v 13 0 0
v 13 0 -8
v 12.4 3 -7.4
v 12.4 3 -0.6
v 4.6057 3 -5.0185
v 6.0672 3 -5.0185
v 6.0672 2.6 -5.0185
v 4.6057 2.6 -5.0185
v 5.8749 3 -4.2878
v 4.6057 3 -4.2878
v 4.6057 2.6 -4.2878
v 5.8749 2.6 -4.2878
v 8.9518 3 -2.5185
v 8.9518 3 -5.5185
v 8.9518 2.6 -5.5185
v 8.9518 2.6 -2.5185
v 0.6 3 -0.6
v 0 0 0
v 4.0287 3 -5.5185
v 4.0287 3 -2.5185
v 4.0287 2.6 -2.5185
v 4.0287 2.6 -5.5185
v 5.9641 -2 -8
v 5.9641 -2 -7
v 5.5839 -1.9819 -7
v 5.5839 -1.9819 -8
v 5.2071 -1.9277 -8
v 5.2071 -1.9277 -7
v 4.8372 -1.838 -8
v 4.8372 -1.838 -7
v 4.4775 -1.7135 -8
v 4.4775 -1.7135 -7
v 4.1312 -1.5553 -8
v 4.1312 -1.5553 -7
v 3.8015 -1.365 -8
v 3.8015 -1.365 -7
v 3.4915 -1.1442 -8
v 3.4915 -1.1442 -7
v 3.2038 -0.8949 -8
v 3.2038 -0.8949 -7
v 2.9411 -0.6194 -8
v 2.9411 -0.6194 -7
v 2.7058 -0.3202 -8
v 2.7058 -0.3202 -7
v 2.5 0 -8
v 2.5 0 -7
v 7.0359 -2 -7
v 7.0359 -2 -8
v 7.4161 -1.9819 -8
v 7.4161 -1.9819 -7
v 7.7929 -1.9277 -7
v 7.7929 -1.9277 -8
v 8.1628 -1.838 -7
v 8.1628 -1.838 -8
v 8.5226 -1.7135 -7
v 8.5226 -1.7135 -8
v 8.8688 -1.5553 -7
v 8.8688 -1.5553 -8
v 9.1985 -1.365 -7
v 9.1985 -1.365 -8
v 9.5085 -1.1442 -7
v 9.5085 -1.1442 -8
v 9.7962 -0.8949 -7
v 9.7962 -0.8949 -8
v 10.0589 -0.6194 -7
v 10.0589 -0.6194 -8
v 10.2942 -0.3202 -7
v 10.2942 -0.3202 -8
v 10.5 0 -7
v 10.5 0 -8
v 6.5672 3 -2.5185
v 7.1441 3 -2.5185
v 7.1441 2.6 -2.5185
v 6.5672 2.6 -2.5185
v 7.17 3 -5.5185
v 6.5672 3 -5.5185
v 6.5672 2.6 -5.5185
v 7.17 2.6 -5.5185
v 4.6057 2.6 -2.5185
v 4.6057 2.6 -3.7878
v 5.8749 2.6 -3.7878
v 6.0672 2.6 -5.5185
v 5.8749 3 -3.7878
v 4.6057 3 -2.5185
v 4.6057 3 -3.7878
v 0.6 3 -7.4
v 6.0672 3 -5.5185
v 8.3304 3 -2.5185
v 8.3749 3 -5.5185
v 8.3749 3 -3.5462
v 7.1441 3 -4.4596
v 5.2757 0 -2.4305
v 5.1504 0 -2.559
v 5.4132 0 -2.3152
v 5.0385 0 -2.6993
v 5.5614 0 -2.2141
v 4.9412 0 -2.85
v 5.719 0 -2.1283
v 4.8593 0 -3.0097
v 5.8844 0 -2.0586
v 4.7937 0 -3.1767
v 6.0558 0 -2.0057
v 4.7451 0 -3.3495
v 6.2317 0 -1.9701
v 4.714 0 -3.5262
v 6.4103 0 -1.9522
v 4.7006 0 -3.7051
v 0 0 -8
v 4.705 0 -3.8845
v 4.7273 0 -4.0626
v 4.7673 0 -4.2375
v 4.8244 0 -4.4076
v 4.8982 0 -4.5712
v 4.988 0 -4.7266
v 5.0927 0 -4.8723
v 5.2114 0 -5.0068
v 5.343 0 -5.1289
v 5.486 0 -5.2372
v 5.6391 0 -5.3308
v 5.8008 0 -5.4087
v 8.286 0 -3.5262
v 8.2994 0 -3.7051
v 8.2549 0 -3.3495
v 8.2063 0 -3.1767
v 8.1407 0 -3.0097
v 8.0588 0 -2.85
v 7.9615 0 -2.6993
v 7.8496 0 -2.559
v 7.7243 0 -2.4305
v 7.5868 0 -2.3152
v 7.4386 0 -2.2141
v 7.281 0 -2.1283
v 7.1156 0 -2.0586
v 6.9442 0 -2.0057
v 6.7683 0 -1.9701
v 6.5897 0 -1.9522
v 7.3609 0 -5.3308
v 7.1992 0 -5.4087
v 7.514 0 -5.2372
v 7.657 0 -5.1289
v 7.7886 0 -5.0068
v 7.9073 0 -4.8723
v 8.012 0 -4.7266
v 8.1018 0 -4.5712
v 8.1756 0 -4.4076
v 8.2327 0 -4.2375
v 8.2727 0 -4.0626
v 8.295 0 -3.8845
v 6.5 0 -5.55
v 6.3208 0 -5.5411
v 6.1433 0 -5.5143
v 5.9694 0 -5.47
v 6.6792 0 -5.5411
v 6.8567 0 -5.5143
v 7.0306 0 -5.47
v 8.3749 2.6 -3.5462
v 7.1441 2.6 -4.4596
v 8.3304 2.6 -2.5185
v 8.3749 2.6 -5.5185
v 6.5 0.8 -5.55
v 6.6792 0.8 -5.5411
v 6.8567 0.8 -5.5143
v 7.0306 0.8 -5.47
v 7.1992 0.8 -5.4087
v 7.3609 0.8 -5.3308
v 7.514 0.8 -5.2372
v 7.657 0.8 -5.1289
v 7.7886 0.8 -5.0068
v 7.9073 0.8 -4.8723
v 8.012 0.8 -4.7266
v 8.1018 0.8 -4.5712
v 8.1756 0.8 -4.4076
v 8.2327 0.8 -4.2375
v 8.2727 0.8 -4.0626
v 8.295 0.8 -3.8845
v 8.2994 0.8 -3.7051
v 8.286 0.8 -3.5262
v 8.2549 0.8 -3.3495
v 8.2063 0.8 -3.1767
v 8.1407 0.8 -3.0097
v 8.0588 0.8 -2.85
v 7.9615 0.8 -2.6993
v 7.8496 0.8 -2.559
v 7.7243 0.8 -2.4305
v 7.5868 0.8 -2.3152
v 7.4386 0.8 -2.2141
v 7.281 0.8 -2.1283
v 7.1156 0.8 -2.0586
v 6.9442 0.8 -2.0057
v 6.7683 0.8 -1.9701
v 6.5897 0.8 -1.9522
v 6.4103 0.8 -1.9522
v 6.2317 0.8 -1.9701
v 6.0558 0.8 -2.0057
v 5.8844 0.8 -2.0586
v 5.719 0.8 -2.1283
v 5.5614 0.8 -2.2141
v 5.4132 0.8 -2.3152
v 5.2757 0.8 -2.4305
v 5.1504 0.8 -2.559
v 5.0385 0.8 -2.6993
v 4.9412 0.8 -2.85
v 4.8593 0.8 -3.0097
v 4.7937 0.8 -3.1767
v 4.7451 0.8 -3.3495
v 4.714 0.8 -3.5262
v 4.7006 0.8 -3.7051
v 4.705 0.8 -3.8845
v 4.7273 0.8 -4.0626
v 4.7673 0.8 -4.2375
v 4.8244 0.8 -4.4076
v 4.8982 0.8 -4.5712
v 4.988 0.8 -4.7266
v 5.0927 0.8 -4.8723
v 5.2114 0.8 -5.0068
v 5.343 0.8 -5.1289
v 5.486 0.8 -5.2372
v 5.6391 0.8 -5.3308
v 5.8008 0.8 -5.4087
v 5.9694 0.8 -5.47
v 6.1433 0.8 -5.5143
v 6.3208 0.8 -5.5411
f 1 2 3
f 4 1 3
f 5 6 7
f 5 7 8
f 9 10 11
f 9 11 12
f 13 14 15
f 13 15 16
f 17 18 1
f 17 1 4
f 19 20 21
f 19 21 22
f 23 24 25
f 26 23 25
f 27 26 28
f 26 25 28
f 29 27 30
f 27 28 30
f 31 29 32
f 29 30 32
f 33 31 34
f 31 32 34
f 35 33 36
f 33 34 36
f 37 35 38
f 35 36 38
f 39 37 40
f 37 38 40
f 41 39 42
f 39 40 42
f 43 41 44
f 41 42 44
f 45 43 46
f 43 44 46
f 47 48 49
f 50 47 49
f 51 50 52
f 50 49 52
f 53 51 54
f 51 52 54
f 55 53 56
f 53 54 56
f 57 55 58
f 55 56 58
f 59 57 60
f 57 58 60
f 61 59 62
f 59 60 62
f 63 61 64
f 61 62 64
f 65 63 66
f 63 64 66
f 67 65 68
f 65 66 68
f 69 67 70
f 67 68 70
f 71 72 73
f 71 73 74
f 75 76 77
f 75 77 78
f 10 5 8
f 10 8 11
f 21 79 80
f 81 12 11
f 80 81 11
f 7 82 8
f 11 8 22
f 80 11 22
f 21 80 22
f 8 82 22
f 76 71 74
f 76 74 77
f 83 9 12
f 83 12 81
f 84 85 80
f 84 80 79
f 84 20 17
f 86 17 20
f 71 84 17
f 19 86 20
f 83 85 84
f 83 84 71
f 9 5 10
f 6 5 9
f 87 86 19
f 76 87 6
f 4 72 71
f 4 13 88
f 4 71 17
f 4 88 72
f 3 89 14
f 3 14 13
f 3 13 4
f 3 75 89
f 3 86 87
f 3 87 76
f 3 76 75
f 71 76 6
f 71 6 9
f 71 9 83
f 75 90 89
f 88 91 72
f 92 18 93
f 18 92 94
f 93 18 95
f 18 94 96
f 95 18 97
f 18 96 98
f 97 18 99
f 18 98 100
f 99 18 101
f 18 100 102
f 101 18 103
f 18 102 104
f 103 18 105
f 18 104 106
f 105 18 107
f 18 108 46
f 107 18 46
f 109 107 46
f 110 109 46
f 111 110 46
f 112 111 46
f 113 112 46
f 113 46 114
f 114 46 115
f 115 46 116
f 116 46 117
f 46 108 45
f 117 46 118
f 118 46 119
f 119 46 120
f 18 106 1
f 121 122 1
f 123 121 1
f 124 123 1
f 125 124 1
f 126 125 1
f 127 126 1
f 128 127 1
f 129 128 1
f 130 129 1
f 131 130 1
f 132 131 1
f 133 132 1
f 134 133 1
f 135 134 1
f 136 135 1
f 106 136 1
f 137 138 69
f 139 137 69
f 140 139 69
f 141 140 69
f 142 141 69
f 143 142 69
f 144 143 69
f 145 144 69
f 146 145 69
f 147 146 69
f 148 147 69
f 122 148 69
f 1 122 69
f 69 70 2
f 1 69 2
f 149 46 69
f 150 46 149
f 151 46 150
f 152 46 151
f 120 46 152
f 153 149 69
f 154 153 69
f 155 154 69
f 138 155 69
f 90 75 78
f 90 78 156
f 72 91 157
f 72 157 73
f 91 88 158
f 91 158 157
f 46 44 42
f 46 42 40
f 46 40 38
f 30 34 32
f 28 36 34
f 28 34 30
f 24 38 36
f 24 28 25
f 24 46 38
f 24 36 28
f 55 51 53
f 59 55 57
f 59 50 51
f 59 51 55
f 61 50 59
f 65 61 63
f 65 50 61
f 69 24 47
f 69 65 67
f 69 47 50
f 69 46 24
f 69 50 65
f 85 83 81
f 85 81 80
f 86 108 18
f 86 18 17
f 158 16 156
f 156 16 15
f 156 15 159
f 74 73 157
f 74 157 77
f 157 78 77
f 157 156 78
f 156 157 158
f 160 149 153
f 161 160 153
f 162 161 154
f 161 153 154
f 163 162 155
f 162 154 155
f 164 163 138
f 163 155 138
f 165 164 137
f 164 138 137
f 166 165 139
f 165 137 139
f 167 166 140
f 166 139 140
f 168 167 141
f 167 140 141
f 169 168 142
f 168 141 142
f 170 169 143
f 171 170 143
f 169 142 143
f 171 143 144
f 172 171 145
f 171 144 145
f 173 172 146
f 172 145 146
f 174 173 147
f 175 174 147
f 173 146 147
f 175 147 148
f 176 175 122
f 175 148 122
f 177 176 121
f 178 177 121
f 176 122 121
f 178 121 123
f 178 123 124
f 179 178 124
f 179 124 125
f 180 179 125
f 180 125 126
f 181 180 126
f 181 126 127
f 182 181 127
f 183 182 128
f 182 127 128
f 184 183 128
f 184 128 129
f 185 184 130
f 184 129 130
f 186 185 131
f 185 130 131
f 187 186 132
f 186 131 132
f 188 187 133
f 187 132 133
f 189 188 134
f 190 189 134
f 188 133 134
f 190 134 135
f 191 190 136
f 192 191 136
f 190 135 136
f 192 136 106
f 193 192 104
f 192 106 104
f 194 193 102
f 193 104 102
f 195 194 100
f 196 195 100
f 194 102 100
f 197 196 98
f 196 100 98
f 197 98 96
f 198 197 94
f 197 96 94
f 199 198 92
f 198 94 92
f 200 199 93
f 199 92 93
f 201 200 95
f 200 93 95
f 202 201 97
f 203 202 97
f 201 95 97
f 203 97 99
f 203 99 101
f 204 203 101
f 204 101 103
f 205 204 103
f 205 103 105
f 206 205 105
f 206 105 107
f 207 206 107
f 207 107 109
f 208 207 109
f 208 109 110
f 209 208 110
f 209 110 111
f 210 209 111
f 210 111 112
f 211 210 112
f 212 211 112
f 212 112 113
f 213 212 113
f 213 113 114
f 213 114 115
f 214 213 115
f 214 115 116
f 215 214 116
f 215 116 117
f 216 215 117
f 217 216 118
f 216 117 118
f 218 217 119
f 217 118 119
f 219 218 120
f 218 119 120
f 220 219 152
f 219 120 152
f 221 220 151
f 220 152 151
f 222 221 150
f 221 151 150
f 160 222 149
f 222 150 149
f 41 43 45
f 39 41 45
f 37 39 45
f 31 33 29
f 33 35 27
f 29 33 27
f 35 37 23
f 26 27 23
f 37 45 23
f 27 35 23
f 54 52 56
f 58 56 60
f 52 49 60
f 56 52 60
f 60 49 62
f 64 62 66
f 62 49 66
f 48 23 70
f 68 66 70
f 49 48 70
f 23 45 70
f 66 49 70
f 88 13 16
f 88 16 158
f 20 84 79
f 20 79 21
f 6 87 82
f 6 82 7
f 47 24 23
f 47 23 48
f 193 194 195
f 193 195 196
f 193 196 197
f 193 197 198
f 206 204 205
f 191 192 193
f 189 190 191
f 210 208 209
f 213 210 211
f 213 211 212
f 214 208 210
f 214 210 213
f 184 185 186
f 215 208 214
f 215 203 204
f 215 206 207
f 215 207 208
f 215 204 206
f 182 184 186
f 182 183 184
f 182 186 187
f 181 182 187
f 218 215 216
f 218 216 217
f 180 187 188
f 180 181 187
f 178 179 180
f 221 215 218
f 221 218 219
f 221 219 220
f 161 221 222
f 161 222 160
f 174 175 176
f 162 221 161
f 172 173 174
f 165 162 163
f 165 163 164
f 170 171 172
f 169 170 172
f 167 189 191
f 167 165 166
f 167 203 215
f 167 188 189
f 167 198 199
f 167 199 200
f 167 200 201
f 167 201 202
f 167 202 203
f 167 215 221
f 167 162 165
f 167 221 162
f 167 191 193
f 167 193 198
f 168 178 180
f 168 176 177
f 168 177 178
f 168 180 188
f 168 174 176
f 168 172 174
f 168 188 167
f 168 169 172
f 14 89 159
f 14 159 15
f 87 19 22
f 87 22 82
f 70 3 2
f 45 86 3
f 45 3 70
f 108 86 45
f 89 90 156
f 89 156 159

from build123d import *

# Parameters (mm, degrees)
SKETCH1_W               = 13
SKETCH1_H               = 8
BOSS_EXTRUDE1_DEPTH     = 3
CUT_EXTRUDE1_DEPTH      = 16.556349186
CUT_EXTRUDE1_DEPTH_BACK = 16.556349186
CUT_EXTRUDE2_DEPTH      = 16.556349186
CUT_EXTRUDE2_DEPTH_BACK = 16.556349186
SKETCH4_R               = 1.8
CUT_EXTRUDE3_DEPTH      = 0.8
SKETCH5_W               = 8
SKETCH5_H               = 1
BOSS_EXTRUDE2_DEPTH     = 2
FILLET1_R               = 4
CUT_EXTRUDE4_DEPTH      = 0.4


with BuildPart() as part:
    # Sketch1 → Boss-Extrude1 (new body)
    with BuildSketch(Plane(origin=(0, 0, 0), x_dir=(1, 0, 0), z_dir=(0, 1, 0))):
        with Locations((6.5, 4)):
            Rectangle(SKETCH1_W, SKETCH1_H)
    extrude(amount=BOSS_EXTRUDE1_DEPTH)

    # Sketch2 → Cut-Extrude1 (cut, two sides: drawn at the far end of the back side and taken through both)
    with BuildSketch(Plane.XY.offset(-CUT_EXTRUDE1_DEPTH_BACK)):
        Polygon((0, 0), (0.6, 3), (0, 3), align=None)
        Polygon((13, 0), (12.4, 3), (13, 3), align=None)
    extrude(amount=CUT_EXTRUDE1_DEPTH + CUT_EXTRUDE1_DEPTH_BACK, mode=Mode.SUBTRACT)

    # Sketch3 → Cut-Extrude2 (cut, two sides: drawn at the far end of the back side and taken through both)
    with BuildSketch(Plane(origin=(0, 0, 0), x_dir=(0, 0, -1), z_dir=(1, 0, 0)).offset(-CUT_EXTRUDE2_DEPTH_BACK)):
        Polygon((0, 0), (0.6, 3), (0, 3), align=None)
        Polygon((8, 3), (7.4, 3), (8, 0), align=None)
    extrude(amount=CUT_EXTRUDE2_DEPTH + CUT_EXTRUDE2_DEPTH_BACK, mode=Mode.SUBTRACT)

    # Sketch4 → Cut-Extrude3 (cut)
    with BuildSketch(Plane.XZ):
        with Locations(Location((6.50000125, -3.75, 0), (0, 0, 270))):
            Circle(SKETCH4_R)
    extrude(amount=-CUT_EXTRUDE3_DEPTH, mode=Mode.SUBTRACT)

    # Sketch5 → Boss-Extrude2 (add)
    with BuildSketch(Plane.XZ):
        with Locations((6.500011, -7.5)):
            Rectangle(SKETCH5_W, SKETCH5_H)
    extrude(amount=BOSS_EXTRUDE2_DEPTH)

    # Fillet1
    # the kernel refuses this fillet: 4 mm, written as the material it takes off along each edge
    with BuildSketch(Plane(origin=(10.500011, -2, -16.660254038), x_dir=(0, 1, 0), z_dir=(0, 0, 1)), Plane(origin=(2.500011, -2, 1.660254038), x_dir=(0, 1, 0), z_dir=(0, 0, -1))) as fillet1_piece_1:
        with BuildLine():
            CenterArc((4, 3.464101615), FILLET1_R, 180, 60)
            Line((0, 3.464101615), (-0.08, 3.464101615))
            Line((-0.08, 3.464101615), (-0.08, 0))
            Line((-0.08, 0), (0, -0.08))
            ThreePointArc((0, -0.08), (1, -0.08), (1.96, -0.069282032))
            Line((1.96, -0.069282032), (2, 0))
        make_face()
    extrude(amount=18.320508076, mode=Mode.SUBTRACT)

    # Sketch6 → Cut-Extrude4 (cut)
    with BuildSketch(Plane(origin=(0, 3, 0), x_dir=(1, 0, 0), z_dir=(0, 1, 0))):
        Polygon((4.028737707, 2.518536397), (4.028737707, 5.518536397), (6.067199245, 5.518536397), (6.067199245, 5.018536397), (4.605660784, 5.018536397), (4.605660784, 4.287767167), (5.874891553, 4.287767167), (5.874891553, 3.787767167), (4.605660784, 3.787767167), (4.605660784, 2.518536397), align=None)
        Polygon((6.567199245, 2.518536397), (6.567199245, 5.518536397), (7.169963668, 5.518536397), (8.374891553, 3.546180628), (8.374891553, 5.518536397), (8.95181463, 5.518536397), (8.95181463, 2.518536397), (8.330420399, 2.518536397), (7.144122322, 4.459642167), (7.144122322, 2.518536397), align=None)
    extrude(amount=-CUT_EXTRUDE4_DEPTH, mode=Mode.SUBTRACT)


solid = part.part
